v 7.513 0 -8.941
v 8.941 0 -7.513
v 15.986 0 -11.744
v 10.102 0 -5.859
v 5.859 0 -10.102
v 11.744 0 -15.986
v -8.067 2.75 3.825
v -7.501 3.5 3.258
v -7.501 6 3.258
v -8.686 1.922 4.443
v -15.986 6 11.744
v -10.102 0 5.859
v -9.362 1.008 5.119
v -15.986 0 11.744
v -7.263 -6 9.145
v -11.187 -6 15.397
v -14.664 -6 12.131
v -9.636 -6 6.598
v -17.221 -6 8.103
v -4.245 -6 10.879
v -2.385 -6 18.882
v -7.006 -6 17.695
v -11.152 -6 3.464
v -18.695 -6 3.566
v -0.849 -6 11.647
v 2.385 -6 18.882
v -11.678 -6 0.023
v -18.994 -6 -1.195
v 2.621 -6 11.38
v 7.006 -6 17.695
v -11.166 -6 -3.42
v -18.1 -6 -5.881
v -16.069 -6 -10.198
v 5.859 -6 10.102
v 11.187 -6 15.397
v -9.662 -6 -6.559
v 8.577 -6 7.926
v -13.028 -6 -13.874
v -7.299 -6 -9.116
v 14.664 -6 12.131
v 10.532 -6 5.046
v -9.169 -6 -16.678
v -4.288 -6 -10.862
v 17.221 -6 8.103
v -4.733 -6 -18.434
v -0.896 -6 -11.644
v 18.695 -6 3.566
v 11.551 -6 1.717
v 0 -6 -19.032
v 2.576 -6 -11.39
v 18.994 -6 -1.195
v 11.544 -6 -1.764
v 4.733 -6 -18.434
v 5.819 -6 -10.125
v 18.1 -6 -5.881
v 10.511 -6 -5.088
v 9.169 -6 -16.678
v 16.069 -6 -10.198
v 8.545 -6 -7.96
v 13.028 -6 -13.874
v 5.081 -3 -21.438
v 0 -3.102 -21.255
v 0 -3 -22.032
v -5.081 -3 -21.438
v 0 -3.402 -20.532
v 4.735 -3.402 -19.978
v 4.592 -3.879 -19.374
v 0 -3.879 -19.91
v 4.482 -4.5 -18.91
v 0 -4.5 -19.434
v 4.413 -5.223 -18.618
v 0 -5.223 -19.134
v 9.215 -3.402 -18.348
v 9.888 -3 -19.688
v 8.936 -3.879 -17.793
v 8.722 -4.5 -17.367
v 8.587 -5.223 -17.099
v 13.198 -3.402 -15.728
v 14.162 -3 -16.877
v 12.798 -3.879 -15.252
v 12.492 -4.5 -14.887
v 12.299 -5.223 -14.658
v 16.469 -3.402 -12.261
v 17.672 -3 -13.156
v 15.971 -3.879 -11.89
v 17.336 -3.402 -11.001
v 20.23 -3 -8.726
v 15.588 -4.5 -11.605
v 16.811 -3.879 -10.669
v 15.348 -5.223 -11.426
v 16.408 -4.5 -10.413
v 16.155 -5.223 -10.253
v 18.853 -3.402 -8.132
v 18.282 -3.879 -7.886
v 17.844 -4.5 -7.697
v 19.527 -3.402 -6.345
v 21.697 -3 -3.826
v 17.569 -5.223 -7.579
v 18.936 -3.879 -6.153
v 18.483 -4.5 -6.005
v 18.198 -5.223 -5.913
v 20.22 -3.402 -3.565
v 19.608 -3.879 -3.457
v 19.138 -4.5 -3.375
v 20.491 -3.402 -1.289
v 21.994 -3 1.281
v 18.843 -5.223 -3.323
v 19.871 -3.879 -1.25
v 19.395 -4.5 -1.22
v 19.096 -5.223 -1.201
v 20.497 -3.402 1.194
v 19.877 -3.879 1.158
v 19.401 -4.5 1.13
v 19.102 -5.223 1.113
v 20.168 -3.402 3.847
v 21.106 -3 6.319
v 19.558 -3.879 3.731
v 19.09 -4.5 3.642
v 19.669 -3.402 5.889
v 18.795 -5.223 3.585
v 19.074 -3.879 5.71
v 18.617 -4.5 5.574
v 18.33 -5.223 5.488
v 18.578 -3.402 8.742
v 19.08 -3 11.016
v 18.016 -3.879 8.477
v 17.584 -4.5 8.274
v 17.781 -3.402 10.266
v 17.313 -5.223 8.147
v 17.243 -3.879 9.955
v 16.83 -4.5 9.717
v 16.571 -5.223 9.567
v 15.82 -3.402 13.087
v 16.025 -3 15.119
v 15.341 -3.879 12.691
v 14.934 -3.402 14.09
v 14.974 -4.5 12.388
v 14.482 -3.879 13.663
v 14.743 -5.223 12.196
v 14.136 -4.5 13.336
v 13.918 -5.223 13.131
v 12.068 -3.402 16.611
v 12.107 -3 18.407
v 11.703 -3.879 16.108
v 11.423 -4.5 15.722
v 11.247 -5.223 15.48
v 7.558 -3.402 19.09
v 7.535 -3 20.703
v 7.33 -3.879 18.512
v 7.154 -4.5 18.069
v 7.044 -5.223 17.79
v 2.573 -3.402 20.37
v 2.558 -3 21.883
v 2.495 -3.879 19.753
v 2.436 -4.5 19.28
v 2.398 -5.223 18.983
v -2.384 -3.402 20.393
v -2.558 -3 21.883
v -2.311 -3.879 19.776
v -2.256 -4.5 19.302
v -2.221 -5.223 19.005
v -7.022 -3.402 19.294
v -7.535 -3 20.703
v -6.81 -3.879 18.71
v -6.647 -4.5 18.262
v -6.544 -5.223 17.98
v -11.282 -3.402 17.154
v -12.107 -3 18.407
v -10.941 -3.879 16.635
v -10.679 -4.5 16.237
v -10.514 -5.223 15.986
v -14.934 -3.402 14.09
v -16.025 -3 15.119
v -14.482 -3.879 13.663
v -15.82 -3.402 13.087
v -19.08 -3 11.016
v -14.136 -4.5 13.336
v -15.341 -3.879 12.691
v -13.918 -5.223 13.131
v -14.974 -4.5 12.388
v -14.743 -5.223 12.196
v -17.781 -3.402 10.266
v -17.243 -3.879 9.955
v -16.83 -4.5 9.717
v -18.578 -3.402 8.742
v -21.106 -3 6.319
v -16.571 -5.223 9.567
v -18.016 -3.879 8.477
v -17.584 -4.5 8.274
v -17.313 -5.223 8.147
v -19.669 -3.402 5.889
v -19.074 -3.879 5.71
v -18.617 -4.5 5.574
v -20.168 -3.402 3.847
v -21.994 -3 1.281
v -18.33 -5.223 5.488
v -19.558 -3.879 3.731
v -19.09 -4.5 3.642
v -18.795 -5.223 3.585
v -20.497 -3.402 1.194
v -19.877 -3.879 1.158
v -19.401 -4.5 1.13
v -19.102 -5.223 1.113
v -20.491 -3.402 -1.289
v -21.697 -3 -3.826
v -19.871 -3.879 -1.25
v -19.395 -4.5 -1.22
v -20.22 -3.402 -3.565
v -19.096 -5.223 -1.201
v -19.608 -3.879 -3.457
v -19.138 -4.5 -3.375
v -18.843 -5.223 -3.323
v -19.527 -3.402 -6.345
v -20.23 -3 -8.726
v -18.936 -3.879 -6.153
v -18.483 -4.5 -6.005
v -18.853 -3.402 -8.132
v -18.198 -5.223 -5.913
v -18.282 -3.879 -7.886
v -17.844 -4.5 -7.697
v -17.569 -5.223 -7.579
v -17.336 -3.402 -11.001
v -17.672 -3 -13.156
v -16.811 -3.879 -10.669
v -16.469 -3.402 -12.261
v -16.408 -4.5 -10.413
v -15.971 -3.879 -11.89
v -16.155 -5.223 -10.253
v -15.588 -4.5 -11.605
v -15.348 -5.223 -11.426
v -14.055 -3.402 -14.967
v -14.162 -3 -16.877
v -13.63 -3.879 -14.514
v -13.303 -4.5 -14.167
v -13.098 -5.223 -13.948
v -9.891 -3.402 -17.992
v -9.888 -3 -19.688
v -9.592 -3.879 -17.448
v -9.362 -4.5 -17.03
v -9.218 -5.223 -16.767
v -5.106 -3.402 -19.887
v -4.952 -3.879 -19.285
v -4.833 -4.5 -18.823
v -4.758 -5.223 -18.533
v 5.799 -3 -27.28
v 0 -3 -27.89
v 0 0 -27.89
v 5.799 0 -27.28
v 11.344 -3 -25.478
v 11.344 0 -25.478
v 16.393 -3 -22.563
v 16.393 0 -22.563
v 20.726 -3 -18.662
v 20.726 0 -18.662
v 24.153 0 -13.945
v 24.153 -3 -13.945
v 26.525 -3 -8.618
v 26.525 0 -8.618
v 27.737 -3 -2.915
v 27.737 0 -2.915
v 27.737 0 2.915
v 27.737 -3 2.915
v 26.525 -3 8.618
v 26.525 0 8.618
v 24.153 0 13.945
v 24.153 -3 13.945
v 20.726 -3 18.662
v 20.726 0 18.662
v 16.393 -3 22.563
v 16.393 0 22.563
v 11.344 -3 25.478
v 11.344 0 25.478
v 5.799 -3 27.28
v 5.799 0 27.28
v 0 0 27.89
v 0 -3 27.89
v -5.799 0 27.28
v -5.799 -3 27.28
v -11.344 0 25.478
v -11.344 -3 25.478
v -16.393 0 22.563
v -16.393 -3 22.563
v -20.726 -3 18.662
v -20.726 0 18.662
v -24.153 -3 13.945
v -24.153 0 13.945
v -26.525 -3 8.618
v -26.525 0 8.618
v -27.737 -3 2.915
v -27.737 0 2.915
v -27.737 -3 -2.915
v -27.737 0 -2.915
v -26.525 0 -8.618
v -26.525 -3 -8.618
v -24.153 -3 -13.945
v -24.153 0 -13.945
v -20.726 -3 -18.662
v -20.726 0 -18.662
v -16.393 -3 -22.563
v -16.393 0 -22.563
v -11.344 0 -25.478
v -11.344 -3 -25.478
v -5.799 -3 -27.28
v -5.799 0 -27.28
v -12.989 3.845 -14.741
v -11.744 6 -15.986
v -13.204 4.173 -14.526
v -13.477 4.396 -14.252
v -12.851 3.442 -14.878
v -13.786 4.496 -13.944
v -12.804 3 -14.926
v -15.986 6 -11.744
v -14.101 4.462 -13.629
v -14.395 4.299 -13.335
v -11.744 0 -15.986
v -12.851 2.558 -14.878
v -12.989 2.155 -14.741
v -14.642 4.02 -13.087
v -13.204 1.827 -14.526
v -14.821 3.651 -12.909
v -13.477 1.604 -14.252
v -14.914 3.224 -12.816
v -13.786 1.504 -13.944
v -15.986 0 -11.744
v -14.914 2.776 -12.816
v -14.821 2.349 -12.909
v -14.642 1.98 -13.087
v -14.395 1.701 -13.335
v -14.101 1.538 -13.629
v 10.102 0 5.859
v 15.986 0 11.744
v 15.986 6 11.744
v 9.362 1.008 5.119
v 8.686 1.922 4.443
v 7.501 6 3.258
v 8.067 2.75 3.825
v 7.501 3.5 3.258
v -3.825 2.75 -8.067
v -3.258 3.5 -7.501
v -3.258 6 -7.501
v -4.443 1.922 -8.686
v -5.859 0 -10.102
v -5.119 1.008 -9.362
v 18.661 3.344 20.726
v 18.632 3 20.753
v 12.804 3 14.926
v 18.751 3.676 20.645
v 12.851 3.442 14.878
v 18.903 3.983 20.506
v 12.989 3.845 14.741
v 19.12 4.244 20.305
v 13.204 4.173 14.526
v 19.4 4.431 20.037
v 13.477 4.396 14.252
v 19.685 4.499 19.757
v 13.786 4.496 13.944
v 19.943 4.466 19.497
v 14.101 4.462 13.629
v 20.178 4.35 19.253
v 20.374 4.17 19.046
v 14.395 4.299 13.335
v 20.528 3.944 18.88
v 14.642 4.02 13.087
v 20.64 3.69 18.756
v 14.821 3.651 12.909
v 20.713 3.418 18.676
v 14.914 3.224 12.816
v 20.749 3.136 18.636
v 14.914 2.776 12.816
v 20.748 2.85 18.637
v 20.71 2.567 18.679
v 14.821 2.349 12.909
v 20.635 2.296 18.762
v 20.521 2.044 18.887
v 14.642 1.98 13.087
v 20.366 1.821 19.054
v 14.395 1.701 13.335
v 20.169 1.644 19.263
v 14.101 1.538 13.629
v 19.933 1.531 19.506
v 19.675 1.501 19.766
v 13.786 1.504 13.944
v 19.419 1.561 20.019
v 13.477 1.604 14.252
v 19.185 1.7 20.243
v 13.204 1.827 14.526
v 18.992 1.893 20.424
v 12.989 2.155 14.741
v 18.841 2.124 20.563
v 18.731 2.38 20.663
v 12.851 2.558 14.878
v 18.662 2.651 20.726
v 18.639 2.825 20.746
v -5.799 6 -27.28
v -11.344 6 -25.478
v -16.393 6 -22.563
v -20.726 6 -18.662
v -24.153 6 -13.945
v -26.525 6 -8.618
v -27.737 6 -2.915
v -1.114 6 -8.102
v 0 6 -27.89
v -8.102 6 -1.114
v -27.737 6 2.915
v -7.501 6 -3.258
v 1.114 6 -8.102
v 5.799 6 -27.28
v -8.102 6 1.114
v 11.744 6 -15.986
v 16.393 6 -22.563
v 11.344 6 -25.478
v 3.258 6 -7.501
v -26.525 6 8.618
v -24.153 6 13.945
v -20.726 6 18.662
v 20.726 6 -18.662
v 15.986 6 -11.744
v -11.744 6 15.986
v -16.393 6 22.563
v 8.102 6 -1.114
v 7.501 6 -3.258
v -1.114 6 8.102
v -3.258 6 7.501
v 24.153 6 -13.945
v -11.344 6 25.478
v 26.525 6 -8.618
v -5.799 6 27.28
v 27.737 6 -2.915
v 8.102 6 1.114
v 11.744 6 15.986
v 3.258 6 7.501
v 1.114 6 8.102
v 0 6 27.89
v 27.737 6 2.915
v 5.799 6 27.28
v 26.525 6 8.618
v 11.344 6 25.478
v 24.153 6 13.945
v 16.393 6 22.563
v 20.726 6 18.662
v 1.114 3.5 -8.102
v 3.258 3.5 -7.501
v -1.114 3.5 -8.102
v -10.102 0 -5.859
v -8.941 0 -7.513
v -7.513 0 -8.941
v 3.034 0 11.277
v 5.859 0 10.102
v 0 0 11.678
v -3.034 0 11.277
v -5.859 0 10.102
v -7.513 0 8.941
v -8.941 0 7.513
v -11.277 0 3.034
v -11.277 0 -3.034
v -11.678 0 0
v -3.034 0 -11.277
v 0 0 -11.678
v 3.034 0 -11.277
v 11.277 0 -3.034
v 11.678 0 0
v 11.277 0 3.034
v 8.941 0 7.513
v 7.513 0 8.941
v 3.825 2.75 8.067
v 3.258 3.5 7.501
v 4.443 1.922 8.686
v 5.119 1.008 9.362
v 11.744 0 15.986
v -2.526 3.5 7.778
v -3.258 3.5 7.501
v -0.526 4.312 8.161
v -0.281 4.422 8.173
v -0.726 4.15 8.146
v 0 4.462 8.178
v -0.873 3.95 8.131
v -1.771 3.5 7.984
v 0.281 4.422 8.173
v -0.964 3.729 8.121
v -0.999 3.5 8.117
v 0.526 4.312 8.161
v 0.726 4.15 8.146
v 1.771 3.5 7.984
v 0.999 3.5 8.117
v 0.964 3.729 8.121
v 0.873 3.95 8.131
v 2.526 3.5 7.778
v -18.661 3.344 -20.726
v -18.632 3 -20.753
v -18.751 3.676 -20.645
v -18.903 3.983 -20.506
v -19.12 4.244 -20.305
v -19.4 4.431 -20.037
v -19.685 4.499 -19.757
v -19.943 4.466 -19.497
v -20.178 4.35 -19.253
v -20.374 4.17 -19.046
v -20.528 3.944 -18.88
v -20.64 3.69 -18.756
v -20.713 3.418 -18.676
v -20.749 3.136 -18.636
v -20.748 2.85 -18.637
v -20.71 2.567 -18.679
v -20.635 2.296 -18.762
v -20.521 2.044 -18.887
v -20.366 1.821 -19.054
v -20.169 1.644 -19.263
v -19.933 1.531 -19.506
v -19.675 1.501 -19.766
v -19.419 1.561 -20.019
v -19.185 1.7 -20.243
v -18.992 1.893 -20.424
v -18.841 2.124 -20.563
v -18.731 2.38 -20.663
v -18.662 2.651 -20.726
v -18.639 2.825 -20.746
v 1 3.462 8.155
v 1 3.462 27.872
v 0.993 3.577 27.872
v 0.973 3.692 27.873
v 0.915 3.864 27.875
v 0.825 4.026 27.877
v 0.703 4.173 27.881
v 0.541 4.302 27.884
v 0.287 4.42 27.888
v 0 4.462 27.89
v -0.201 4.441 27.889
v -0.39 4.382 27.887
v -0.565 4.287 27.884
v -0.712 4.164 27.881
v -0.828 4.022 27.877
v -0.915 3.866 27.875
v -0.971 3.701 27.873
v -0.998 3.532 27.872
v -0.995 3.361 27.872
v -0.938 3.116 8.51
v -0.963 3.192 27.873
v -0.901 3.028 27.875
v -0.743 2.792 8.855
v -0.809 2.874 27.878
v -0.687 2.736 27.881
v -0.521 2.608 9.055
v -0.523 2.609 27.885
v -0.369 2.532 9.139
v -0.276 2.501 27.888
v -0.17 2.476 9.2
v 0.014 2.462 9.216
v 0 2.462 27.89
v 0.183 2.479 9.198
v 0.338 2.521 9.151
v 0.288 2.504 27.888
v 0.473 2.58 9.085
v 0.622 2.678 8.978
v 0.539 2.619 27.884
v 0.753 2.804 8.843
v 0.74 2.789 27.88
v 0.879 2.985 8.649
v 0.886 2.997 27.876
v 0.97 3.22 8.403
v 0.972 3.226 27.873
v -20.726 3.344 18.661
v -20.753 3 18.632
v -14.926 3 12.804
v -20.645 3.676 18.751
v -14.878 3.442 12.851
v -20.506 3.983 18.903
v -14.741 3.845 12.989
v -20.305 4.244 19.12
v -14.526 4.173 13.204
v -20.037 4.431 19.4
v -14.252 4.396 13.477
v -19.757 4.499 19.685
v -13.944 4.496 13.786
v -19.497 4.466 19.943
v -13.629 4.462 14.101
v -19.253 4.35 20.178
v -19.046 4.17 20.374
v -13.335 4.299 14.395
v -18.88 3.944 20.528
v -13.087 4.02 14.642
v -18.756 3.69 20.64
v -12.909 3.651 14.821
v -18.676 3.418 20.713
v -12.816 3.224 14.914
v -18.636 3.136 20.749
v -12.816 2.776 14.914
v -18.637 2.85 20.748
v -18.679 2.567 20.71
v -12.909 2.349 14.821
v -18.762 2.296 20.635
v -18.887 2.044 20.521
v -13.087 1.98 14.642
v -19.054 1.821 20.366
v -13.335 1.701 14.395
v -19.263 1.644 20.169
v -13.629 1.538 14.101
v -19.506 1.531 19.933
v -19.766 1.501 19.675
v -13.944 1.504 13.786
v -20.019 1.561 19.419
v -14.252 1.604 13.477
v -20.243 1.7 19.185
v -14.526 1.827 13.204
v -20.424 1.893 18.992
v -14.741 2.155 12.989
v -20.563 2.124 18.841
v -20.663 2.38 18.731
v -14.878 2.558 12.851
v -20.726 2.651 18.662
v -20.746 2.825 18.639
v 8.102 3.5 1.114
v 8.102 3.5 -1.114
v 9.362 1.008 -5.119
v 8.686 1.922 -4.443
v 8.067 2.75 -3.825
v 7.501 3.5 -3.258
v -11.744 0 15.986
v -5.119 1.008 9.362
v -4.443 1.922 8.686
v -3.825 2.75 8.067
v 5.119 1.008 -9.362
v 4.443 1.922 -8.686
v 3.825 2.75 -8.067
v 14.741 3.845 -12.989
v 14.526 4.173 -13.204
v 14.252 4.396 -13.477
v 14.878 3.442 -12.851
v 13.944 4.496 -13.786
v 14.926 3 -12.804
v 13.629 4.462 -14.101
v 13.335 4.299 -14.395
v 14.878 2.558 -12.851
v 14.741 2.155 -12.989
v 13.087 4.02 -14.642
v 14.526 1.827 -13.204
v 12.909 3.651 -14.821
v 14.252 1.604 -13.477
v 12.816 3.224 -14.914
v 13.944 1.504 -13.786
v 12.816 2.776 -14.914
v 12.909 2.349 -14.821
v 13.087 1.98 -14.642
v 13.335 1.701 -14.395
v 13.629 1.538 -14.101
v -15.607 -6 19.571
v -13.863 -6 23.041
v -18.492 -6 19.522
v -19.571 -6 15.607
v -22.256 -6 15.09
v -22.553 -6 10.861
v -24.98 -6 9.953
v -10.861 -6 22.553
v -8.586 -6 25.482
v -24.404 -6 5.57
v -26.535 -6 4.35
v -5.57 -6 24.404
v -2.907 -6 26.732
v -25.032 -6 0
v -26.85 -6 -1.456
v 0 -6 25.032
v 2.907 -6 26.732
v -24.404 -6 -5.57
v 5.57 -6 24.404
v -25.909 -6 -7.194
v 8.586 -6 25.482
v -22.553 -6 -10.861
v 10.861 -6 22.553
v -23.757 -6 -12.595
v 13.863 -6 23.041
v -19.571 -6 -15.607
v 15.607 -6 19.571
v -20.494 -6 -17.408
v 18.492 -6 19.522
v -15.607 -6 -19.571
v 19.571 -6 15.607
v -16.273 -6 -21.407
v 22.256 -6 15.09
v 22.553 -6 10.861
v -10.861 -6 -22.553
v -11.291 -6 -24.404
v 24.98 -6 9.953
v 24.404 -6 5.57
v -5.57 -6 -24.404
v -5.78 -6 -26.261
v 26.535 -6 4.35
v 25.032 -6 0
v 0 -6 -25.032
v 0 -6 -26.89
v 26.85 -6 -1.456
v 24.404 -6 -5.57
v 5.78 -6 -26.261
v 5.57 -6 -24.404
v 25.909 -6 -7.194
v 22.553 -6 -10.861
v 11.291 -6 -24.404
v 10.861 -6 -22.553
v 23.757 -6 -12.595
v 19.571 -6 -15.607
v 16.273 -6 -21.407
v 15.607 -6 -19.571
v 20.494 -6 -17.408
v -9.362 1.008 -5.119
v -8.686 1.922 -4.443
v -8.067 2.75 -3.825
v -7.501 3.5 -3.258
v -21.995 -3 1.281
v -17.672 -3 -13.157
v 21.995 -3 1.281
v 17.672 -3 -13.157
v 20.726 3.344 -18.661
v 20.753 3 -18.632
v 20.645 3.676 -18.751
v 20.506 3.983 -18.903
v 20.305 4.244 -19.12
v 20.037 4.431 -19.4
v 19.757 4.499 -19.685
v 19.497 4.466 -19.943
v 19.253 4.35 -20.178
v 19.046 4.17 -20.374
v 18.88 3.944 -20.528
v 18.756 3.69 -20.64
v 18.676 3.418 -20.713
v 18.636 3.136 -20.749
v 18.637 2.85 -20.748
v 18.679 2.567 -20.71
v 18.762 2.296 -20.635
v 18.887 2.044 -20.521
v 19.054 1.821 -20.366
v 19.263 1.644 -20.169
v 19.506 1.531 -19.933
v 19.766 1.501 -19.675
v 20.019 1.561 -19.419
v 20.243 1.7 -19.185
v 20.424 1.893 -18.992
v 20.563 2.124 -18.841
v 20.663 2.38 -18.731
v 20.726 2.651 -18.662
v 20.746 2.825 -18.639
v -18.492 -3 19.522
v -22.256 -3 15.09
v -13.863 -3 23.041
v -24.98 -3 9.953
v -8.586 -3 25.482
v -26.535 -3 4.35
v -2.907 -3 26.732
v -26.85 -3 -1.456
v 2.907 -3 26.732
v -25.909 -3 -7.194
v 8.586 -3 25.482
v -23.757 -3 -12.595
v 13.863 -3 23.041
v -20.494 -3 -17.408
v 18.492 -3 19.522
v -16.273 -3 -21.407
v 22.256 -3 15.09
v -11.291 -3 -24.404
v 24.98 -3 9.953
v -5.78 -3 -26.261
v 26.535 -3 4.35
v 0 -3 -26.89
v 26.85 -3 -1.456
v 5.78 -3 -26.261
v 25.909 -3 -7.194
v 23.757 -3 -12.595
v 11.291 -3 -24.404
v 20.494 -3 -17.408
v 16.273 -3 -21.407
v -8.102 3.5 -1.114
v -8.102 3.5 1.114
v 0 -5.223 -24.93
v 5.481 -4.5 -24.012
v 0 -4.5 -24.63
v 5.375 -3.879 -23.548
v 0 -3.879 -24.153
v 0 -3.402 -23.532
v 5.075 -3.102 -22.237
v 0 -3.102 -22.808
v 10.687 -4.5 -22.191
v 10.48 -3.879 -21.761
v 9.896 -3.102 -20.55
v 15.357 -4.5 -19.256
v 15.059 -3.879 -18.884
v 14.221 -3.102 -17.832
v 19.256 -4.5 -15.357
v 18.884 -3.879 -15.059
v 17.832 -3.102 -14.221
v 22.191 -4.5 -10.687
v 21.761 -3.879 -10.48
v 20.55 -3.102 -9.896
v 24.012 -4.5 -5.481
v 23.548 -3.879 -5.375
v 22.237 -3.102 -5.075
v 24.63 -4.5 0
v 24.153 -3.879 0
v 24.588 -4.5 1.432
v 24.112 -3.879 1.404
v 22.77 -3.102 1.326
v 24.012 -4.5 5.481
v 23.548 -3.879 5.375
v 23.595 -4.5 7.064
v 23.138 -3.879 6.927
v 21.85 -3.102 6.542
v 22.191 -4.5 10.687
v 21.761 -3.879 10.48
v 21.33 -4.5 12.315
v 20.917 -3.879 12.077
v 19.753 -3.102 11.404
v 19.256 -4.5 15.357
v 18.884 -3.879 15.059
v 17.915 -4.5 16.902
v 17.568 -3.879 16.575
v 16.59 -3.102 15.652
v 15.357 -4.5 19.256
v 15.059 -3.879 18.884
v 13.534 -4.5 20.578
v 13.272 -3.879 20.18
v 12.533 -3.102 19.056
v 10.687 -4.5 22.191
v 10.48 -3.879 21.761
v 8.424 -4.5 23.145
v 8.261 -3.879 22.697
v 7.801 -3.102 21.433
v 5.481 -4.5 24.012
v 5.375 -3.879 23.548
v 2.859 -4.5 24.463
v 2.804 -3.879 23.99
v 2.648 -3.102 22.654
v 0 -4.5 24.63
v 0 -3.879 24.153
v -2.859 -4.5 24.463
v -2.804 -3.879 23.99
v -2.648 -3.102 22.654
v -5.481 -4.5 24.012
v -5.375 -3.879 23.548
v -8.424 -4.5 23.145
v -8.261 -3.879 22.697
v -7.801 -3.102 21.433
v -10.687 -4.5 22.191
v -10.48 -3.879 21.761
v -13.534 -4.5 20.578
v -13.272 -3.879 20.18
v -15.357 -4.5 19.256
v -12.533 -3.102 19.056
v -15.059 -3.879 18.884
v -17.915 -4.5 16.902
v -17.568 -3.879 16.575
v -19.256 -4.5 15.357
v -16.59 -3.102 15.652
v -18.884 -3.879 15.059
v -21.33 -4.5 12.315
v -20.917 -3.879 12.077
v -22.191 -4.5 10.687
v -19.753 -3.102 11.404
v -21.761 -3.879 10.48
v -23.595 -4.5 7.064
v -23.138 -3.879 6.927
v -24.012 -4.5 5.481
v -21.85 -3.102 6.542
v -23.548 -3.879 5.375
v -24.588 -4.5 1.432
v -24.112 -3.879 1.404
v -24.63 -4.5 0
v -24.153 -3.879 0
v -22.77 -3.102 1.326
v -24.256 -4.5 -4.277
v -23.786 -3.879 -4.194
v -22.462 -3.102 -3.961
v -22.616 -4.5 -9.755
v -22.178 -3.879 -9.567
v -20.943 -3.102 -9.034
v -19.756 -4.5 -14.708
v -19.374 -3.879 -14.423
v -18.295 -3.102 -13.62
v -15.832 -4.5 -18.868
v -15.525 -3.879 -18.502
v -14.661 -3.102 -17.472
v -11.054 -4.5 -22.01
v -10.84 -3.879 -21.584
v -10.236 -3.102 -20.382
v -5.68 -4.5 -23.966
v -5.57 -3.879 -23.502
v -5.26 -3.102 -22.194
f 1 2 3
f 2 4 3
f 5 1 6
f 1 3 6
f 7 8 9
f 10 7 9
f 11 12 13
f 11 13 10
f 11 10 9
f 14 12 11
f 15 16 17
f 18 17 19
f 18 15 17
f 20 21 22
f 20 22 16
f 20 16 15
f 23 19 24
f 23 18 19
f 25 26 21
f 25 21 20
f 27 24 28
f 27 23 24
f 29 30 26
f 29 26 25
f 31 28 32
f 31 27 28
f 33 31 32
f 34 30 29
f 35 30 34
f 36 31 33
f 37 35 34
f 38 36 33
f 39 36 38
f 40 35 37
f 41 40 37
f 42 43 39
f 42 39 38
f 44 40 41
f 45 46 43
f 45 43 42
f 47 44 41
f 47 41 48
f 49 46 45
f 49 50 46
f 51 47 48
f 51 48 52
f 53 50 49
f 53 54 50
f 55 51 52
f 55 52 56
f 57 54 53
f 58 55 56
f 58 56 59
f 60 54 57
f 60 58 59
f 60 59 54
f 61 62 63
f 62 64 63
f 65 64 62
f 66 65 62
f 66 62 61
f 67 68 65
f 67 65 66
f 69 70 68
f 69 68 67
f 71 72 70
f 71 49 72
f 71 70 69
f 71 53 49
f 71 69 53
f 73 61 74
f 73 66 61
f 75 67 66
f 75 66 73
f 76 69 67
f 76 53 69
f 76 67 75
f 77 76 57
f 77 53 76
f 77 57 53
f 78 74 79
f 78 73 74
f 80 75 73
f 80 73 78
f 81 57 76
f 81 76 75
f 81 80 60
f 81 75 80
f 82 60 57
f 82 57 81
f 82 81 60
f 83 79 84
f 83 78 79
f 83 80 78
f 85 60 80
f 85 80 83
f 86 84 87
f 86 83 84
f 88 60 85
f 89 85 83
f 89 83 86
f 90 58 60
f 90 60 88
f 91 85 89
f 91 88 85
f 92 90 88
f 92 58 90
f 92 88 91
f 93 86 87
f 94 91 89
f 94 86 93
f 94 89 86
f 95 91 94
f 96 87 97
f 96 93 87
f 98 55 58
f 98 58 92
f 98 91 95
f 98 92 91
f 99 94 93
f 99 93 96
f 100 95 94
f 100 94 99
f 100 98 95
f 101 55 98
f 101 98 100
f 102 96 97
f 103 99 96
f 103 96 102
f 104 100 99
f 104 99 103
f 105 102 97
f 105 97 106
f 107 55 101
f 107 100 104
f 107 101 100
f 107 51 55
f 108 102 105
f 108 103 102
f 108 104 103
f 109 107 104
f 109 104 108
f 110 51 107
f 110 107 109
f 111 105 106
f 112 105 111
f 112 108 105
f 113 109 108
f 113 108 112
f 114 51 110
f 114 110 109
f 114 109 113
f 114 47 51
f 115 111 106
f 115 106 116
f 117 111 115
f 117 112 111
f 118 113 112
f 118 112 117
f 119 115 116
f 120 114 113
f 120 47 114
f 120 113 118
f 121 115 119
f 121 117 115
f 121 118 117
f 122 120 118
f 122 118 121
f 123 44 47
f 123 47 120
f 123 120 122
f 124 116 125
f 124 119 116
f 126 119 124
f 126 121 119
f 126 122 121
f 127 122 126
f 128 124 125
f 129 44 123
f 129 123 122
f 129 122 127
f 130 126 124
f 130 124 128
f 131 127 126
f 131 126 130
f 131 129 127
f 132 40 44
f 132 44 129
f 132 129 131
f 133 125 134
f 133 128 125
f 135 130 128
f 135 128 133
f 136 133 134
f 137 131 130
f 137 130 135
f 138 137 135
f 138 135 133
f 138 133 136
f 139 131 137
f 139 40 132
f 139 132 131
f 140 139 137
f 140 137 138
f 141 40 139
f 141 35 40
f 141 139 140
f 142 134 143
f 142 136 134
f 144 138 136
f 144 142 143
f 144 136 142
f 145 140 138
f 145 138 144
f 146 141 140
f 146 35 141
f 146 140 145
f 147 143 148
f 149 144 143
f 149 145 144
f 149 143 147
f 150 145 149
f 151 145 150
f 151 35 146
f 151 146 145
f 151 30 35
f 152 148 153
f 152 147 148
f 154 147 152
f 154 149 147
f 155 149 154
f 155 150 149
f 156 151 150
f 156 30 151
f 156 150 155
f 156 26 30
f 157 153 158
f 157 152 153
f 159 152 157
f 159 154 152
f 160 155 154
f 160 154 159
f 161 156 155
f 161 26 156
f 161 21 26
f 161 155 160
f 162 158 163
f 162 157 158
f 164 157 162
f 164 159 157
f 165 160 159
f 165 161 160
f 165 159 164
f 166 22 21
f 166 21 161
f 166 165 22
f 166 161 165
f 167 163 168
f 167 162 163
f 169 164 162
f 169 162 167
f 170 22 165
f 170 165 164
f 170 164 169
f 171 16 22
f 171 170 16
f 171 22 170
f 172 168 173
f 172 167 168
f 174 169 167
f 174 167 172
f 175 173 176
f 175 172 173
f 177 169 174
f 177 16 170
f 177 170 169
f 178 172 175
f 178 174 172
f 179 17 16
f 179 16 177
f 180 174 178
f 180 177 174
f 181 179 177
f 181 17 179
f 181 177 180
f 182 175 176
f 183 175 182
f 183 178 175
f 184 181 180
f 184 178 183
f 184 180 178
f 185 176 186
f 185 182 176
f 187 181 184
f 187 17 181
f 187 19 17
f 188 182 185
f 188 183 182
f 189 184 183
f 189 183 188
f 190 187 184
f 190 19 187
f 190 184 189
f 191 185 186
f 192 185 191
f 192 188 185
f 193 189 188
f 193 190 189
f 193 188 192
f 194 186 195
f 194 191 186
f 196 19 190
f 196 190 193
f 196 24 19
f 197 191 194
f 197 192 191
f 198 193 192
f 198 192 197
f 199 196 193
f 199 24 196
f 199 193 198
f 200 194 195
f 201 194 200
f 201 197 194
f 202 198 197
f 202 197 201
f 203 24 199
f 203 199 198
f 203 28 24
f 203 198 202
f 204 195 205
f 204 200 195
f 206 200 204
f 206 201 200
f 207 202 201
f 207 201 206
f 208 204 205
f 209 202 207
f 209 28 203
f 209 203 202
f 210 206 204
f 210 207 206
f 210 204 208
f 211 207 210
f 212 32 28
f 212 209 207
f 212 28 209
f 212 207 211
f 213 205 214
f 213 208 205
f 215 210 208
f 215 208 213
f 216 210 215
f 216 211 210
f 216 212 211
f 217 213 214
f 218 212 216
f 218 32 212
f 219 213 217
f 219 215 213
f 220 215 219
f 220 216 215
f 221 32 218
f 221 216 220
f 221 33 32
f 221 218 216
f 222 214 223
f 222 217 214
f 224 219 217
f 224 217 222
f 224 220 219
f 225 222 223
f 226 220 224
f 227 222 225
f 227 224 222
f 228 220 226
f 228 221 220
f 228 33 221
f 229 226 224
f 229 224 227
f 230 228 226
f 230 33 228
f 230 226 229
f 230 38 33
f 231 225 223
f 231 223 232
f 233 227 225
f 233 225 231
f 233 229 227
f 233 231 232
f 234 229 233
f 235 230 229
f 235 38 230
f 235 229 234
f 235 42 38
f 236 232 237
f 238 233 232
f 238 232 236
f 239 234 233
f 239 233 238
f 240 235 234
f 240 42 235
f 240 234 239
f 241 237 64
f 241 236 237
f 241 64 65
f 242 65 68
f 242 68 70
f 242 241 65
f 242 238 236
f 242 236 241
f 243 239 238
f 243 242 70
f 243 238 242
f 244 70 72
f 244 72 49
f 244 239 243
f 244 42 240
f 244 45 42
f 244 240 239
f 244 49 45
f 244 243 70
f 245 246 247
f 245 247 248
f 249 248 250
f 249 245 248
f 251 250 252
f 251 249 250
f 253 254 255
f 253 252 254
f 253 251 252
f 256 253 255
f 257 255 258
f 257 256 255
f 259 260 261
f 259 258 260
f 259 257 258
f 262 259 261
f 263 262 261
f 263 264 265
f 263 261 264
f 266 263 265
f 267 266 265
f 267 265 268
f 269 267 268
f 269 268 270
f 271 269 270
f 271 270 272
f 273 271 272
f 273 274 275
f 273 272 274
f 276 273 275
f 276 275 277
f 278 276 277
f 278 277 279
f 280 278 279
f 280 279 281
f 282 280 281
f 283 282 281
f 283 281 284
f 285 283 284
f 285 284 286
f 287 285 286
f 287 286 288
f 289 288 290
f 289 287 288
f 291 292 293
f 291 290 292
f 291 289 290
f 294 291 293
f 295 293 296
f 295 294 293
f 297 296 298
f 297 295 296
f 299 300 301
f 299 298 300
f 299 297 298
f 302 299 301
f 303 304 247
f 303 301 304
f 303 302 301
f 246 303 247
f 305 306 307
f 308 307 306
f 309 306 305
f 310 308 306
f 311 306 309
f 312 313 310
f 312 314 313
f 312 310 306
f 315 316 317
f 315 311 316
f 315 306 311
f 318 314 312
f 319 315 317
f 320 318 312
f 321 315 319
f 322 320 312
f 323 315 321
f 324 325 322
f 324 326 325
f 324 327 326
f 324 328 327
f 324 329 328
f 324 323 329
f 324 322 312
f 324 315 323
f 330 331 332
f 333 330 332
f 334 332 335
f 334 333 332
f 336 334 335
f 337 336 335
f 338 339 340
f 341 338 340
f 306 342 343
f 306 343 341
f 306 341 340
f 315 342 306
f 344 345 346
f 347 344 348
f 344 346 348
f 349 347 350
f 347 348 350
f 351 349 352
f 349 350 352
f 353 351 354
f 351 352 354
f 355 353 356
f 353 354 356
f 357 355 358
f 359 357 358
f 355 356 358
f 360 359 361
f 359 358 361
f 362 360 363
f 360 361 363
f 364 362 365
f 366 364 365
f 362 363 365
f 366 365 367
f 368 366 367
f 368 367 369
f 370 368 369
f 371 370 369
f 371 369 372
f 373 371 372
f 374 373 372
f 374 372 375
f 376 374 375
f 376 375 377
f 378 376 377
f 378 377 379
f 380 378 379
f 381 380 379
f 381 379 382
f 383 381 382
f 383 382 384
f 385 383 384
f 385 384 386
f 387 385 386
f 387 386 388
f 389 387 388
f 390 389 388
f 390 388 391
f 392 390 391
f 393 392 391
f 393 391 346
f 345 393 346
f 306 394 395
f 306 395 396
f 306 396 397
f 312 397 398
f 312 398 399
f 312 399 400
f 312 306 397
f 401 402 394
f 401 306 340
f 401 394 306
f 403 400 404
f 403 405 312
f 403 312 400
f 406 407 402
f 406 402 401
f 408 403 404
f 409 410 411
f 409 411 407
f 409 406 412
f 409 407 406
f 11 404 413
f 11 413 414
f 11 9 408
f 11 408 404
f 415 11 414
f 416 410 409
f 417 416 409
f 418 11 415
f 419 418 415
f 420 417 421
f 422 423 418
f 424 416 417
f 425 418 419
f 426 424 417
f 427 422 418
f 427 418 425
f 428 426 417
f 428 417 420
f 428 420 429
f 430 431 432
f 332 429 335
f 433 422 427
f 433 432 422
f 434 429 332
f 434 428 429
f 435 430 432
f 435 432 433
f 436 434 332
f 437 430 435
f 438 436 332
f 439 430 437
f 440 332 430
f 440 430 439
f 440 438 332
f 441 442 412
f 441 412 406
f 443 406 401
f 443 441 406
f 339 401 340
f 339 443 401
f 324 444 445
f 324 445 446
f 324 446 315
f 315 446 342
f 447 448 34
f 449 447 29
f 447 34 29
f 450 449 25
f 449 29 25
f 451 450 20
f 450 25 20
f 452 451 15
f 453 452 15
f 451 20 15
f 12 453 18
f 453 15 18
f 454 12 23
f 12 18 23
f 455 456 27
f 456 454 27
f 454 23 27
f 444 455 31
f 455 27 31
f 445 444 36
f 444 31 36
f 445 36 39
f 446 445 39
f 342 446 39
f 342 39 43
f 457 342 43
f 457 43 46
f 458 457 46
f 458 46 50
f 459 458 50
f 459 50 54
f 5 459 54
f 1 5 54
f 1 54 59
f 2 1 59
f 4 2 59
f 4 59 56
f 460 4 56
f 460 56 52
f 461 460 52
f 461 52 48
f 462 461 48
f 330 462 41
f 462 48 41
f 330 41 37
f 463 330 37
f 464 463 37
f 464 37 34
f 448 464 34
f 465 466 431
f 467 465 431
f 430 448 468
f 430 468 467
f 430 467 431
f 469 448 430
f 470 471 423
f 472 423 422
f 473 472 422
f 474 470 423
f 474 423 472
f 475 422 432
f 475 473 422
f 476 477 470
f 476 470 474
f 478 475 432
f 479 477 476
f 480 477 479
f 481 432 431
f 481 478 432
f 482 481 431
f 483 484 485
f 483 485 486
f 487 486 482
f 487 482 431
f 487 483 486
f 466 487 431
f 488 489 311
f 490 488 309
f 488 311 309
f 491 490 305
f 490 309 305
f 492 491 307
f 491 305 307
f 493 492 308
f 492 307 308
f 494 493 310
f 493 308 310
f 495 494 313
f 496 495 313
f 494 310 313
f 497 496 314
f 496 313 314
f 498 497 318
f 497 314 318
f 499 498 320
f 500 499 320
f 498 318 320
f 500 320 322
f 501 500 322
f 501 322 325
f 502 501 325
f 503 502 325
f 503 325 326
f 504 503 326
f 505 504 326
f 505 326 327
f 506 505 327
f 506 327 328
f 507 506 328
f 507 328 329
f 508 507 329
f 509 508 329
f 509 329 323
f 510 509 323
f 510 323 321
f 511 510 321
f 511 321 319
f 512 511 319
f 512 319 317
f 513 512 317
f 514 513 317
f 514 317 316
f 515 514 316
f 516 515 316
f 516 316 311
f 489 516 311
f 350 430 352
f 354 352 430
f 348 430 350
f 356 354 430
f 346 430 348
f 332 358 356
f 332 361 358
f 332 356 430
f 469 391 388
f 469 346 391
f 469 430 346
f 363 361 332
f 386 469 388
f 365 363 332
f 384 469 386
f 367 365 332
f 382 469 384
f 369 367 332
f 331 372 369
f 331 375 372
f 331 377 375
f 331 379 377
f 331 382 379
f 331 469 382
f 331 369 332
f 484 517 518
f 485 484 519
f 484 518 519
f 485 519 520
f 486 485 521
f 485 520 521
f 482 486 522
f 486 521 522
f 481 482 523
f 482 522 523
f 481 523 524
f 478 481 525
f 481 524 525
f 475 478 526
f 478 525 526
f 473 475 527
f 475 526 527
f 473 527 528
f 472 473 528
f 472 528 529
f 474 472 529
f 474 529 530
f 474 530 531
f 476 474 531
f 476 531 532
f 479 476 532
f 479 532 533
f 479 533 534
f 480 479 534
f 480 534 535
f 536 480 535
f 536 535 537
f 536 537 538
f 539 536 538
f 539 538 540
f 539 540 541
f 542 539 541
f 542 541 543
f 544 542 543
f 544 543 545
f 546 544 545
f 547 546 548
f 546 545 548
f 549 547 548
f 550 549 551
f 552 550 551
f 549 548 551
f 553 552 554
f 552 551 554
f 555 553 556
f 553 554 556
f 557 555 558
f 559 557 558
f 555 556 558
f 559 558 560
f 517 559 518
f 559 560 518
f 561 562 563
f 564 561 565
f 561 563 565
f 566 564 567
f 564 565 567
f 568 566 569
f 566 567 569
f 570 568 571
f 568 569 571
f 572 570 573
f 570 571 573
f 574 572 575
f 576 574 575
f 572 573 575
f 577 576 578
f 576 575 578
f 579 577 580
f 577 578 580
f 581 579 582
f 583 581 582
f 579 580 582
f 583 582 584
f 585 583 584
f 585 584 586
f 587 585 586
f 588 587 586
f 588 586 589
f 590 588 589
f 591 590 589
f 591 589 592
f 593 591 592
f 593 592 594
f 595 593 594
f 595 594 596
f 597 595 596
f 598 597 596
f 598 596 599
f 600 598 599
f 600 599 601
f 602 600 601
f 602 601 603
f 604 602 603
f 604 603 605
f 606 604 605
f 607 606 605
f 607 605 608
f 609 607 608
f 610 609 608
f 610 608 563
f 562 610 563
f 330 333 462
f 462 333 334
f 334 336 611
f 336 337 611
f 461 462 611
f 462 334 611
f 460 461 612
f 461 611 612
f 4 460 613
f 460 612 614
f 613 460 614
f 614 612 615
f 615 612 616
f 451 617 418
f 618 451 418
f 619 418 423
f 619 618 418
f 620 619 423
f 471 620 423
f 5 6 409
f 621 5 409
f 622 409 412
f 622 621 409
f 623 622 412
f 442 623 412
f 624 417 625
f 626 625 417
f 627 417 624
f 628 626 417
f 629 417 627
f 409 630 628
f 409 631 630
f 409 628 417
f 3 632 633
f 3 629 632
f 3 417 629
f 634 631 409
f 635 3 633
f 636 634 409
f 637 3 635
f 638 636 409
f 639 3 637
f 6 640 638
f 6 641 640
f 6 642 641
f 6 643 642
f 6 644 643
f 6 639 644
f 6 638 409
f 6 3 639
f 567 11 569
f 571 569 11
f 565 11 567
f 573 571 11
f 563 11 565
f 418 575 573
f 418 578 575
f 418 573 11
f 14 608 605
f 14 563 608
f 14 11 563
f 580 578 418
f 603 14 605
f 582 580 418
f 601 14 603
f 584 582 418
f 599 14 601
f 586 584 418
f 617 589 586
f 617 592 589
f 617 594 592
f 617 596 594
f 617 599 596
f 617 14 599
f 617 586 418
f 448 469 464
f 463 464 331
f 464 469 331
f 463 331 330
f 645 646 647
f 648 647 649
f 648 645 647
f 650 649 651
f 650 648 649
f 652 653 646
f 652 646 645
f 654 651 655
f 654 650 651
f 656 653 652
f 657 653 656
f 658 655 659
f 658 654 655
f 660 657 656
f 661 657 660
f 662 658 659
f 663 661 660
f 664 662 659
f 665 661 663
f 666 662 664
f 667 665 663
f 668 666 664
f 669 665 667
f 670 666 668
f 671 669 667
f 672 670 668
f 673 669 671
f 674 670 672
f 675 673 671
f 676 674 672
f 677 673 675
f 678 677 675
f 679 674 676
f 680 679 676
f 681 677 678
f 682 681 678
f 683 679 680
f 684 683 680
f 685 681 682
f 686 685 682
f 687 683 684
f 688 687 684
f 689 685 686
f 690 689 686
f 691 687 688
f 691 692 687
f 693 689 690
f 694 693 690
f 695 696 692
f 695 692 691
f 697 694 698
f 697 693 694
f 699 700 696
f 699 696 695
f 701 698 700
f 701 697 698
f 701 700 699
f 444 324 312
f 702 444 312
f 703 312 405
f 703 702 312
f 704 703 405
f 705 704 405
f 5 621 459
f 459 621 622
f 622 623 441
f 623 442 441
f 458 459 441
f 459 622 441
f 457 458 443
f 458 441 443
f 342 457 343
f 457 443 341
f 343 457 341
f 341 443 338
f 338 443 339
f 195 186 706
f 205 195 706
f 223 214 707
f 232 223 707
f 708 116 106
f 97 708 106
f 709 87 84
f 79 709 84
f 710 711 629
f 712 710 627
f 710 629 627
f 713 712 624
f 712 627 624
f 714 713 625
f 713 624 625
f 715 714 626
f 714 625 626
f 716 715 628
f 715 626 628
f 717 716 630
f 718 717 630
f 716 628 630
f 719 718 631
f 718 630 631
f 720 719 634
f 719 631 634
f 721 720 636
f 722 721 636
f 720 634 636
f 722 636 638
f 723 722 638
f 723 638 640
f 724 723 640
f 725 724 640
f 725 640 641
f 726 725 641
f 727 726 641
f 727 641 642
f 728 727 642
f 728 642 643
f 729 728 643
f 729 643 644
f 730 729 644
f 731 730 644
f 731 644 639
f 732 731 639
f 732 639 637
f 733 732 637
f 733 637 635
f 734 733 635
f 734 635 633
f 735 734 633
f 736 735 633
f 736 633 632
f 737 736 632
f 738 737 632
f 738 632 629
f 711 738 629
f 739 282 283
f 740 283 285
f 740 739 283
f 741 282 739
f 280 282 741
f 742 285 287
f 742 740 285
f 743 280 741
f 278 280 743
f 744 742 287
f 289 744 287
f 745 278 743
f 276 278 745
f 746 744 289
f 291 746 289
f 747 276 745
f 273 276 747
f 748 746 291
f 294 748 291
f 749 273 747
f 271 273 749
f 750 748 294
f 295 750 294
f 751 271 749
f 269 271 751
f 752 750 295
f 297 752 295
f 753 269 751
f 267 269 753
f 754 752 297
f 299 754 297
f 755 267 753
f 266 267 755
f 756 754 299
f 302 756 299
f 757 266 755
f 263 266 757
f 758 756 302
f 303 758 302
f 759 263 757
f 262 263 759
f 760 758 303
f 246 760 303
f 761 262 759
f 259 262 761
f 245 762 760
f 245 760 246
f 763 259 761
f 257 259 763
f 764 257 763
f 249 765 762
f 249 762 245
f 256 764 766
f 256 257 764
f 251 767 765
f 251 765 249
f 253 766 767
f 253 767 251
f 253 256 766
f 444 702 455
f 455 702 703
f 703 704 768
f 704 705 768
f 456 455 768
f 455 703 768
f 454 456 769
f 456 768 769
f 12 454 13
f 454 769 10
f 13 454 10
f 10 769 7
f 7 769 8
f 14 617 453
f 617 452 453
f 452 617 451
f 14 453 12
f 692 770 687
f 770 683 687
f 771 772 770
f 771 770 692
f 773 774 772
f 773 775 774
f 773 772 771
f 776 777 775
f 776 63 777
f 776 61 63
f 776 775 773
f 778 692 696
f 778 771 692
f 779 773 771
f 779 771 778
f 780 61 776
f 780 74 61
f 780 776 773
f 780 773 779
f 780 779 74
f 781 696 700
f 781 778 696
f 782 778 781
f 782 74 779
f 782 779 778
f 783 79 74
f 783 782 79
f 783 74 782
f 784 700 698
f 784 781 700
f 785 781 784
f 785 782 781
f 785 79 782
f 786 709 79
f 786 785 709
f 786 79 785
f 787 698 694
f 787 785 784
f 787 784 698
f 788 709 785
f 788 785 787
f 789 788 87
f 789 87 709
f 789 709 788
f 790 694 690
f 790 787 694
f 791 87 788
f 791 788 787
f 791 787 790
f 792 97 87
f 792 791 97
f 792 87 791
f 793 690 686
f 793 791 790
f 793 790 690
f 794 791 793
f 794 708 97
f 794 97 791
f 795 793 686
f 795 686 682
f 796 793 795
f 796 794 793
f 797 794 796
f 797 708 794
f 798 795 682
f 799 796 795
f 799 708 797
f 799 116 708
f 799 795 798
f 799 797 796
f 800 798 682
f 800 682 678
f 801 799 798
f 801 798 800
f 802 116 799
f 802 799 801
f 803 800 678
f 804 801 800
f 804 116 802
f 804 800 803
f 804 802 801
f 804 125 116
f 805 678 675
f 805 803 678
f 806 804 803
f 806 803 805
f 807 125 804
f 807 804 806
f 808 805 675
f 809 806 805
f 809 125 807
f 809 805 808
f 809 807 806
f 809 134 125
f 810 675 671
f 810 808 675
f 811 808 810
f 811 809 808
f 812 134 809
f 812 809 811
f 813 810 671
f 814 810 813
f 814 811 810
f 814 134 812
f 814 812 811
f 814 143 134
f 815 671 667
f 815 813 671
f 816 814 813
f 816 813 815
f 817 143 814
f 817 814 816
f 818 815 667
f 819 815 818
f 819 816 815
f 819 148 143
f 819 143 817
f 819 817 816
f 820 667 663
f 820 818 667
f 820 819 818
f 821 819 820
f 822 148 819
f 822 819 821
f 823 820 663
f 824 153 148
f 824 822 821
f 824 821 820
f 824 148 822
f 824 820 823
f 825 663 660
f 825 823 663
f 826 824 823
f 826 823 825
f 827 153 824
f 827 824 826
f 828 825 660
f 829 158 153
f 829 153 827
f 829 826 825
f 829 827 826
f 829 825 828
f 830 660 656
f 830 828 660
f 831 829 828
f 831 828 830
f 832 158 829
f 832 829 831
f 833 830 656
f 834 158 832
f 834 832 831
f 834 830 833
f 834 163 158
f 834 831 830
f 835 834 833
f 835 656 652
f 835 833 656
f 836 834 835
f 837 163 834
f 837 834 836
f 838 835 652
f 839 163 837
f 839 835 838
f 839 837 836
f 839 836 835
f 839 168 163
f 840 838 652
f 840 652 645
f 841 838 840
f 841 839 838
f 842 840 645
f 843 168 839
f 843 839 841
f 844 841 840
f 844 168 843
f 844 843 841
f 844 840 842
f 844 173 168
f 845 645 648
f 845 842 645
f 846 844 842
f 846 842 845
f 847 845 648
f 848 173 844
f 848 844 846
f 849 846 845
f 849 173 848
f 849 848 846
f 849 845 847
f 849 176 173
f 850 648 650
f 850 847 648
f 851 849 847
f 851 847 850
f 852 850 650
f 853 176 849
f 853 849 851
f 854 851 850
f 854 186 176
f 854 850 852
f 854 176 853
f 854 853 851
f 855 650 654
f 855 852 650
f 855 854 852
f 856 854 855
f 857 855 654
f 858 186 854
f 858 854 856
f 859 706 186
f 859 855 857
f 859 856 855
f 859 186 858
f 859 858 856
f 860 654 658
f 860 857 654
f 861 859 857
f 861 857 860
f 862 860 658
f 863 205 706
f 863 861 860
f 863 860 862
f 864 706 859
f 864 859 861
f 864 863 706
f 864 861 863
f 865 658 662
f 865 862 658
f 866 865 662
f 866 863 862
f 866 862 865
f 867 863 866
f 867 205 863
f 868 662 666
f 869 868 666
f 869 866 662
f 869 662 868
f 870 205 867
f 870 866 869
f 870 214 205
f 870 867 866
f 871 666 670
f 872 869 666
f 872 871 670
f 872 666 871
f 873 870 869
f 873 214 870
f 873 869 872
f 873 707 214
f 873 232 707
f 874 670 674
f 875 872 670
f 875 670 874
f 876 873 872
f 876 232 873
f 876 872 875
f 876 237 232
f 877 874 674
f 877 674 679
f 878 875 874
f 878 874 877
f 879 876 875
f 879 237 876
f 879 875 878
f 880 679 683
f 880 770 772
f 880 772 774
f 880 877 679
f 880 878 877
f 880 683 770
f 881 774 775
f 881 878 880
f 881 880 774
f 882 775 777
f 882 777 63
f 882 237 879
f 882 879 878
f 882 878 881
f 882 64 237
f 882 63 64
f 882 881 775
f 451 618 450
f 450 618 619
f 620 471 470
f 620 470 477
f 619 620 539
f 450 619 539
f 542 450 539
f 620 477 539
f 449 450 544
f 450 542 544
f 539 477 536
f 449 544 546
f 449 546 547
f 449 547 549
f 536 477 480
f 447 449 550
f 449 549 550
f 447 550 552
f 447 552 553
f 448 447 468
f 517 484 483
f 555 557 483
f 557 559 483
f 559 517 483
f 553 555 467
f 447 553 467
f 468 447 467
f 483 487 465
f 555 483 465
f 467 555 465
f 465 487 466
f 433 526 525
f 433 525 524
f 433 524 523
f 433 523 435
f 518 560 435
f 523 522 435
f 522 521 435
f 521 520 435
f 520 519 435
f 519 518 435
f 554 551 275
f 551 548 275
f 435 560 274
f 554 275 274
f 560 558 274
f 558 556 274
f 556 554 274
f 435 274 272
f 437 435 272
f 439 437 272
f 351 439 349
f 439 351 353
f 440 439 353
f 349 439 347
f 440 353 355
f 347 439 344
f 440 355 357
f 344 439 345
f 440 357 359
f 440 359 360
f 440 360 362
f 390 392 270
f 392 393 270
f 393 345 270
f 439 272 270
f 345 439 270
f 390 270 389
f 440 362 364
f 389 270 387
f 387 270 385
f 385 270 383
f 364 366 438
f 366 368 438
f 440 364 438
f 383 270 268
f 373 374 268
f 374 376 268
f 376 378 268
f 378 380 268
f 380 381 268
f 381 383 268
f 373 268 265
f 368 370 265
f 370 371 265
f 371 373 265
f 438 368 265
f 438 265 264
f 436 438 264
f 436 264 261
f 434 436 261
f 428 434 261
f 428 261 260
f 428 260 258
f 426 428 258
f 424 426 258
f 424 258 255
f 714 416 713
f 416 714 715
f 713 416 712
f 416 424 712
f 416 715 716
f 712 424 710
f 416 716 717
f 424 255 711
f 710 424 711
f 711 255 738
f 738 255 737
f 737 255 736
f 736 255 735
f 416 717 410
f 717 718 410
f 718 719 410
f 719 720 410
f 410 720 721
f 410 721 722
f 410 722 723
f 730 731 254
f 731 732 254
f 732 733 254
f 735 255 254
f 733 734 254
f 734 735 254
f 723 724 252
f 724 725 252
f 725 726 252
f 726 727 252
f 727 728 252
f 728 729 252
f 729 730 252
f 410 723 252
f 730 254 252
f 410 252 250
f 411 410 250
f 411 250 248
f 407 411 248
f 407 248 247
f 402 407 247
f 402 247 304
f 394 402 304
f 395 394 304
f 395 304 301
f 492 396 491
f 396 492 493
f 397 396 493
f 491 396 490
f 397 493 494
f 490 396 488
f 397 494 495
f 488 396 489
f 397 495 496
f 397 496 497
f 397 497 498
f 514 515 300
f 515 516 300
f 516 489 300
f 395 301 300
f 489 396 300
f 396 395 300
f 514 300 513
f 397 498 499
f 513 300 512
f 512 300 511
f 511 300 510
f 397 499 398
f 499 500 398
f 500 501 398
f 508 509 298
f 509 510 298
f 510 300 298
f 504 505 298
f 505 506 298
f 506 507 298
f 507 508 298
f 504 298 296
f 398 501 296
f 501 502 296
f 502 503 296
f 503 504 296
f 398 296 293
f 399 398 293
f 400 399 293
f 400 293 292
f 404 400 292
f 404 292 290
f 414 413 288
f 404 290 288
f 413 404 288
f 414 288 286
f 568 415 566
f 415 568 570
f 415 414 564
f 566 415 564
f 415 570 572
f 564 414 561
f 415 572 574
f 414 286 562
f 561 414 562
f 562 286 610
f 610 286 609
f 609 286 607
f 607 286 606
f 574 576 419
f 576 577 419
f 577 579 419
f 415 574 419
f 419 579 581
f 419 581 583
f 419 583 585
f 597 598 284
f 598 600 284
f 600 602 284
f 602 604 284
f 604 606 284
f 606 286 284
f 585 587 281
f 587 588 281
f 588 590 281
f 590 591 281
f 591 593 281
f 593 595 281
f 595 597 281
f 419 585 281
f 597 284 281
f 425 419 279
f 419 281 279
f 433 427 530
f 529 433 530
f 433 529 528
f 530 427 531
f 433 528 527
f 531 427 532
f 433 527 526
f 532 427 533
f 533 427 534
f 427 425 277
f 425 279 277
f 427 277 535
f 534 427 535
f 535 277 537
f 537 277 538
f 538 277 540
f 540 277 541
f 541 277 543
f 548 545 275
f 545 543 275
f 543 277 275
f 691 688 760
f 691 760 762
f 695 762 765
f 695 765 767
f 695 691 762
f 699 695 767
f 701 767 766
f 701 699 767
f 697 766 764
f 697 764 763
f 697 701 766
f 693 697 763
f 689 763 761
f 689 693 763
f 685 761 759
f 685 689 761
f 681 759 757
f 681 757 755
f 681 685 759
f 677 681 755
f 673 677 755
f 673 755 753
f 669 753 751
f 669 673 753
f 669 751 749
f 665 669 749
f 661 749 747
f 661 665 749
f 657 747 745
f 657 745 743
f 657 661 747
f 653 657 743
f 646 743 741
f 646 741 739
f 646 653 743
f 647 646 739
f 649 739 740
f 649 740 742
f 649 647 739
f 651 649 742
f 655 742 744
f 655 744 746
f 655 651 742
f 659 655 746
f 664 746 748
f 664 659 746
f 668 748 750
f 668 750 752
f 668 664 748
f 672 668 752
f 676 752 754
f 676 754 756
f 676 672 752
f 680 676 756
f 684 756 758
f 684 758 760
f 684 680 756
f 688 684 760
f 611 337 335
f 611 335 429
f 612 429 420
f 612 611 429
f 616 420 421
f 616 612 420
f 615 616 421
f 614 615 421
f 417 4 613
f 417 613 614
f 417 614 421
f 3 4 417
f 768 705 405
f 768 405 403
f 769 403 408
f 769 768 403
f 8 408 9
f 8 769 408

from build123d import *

# Parameters (mm, degrees)
SKETCH1_R               = 27.889608224
BOSS_EXTRUDE1_DEPTH     = 6
CUT_EXTRUDE1_REACH      = 61.354
CUT_EXTRUDE1_END_RADIUS = 27.889608224
SKETCH2_R               = 1.5
CIRPATTERN1_COUNT       = 4
CHAMFER1_SIZE           = 3.5
BOSS_EXTRUDE2_START     = 6
SKETCH3_R               = 27.889608224
SKETCH3_R_2             = 11.678118969
BOSS_EXTRUDE2_DEPTH     = 6
CUT_EXTRUDE2_REACH      = 64.651
SKETCH4_R               = 1
SKETCH5_R               = 27.889608224
SKETCH5_R_2             = 26.889608224
SKETCH5_R_3             = 25.031826588
SKETCH5_R_4             = 19.031826588
CUT_EXTRUDE3_DEPTH      = 3
FILLET1_R               = 3


with BuildPart() as part:
    # Sketch1 → Boss-Extrude1 (new body)
    with BuildSketch(Plane(origin=(0, 0, 0), x_dir=(1, 0, 0), z_dir=(0, 1, 0))):
        with Locations(Location((0, 0, 0), (0, 0, 270))):
            Circle(SKETCH1_R)
        with BuildLine():
            ThreePointArc((-7.500987149, 3.258346461), (-8.178118969, 0), (-7.500987149, -3.258346461))
            Line((-7.500987149, -3.258346461), (-15.986268523, -11.743627836))
            Line((-15.986268523, -11.743627836), (-11.743627836, -15.986268523))
            Line((-11.743627836, -15.986268523), (-3.258346461, -7.500987149))
            ThreePointArc((-3.258346461, -7.500987149), (0, -8.178118969), (3.258346461, -7.500987149))
            Line((3.258346461, -7.500987149), (11.743627836, -15.986268523))
            Line((11.743627836, -15.986268523), (15.986268523, -11.743627836))
            Line((15.986268523, -11.743627836), (7.500987149, -3.258346461))
            ThreePointArc((7.500987149, -3.258346461), (8.178118969, 0), (7.500987149, 3.258346461))
            Line((7.500987149, 3.258346461), (15.986268523, 11.743627836))
            Line((15.986268523, 11.743627836), (11.743627836, 15.986268523))
            Line((11.743627836, 15.986268523), (3.258346461, 7.500987149))
            ThreePointArc((3.258346461, 7.500987149), (0, 8.178118969), (-3.258346461, 7.500987149))
            Line((-3.258346461, 7.500987149), (-11.743627836, 15.986268523))
            Line((-11.743627836, 15.986268523), (-15.986268523, 11.743627836))
            Line((-15.986268523, 11.743627836), (-7.500987149, 3.258346461))
        make_face(mode=Mode.SUBTRACT)
    extrude(amount=BOSS_EXTRUDE1_DEPTH)

    # Cut-Extrude1: up to this cylinder (the profile starts inside it)
    cut_extrude1_end = Plane(origin=(0, 3, 0), z_dir=(0, -1, 0)) * Cylinder(CUT_EXTRUDE1_END_RADIUS, 179.487216449, mode=Mode.PRIVATE)
    # Sketch2 → Cut-Extrude1 (cut, up to the surface)
    with BuildSketch(Plane(origin=(13.864948179, 0, -13.864948179), x_dir=(0.7071067811865458, 0, 0.7071067811865492), z_dir=(-0.7071067811865492, 0, 0.7071067811865458)), mode=Mode.PRIVATE) as cut_extrude1_sk1:
        with Locations((0, 3)):
            Circle(SKETCH2_R)
    cut_extrude1_tool1 = extrude(cut_extrude1_sk1.sketch, amount=-CUT_EXTRUDE1_REACH, mode=Mode.PRIVATE) & cut_extrude1_end
    cut_extrude1 = cut_extrude1_tool1.solids().sort_by_distance((13.864948, 3, -13.864948))[0]
    add(cut_extrude1, mode=Mode.SUBTRACT)

    # CirPattern1: Cut-Extrude1 ×4 about axis
    cirpattern1_axis = Axis((0, 6, 0), (0, -1, 0))
    for i in range(1, CIRPATTERN1_COUNT):
        add(cut_extrude1.rotate(cirpattern1_axis, i * 360 / CIRPATTERN1_COUNT), mode=Mode.SUBTRACT)

    # Chamfer1
    chamfer1_edges = [part.edges().sort_by_distance(p)[0] for p in [
        (0, 0, 8.178118969),
        (8.178118969, 0, 0),
        (0, 0, -8.178118969),
        (-8.178118969, 0, 0),
    ]]
    chamfer(chamfer1_edges, length=CHAMFER1_SIZE)

    # Sketch3 → Boss-Extrude2 (add)
    with BuildSketch(Plane.XZ.offset(BOSS_EXTRUDE2_START)):
        with Locations(Location((0, 0, 0), (0, 0, 270))):
            Circle(SKETCH3_R)
        with Locations(Location((0, 0, 0), (0, 0, 59.885646145))):
            Circle(SKETCH3_R_2, mode=Mode.SUBTRACT)
    extrude(amount=-BOSS_EXTRUDE2_DEPTH)

    # Sketch4 → Cut-Extrude2 (cut, up to next)
    with BuildSketch(Plane.XY.offset(27.889608224), mode=Mode.PRIVATE) as cut_extrude2_sk1:
        with Locations((0, 3.461741733)):
            Circle(SKETCH4_R)
    cut_extrude2_tool1 = extrude(cut_extrude2_sk1.sketch, amount=-CUT_EXTRUDE2_REACH, mode=Mode.PRIVATE) & part.part
    add(cut_extrude2_tool1.solids().sort_by_distance((0, 3.461742, 27.889608))[0], mode=Mode.SUBTRACT)

    # Sketch5 → Cut-Extrude3 (cut)
    # profile 1 of 2: a face of its own
    with BuildSketch(Plane.XZ.offset(6)):
        with Locations(Location((0, 0, 0), (0, 0, 270))):
            Circle(SKETCH5_R)
        with Locations(Location((0, 0, 0), (0, 0, 270))):
            Circle(SKETCH5_R_2, mode=Mode.SUBTRACT)
    # profile 2 of 2: a face of its own
    with BuildSketch(Plane.XZ.offset(6)):
        with Locations(Location((0, 0, 0), (0, 0, 270))):
            Circle(SKETCH5_R_3)
        with Locations(Location((0, 0, 0), (0, 0, 270))):
            Circle(SKETCH5_R_4, mode=Mode.SUBTRACT)
    extrude(amount=-CUT_EXTRUDE3_DEPTH, mode=Mode.SUBTRACT)

    # Fillet1
    fillet1_edges = [part.edges().sort_by_distance(p)[0] for p in [
        (0, -3, 25.031826588),
        (0, -3, 19.031826588),
    ]]
    fillet(fillet1_edges, radius=FILLET1_R - 0.0001)  # a hair under: the kernel refuses the full size


solid = part.part
